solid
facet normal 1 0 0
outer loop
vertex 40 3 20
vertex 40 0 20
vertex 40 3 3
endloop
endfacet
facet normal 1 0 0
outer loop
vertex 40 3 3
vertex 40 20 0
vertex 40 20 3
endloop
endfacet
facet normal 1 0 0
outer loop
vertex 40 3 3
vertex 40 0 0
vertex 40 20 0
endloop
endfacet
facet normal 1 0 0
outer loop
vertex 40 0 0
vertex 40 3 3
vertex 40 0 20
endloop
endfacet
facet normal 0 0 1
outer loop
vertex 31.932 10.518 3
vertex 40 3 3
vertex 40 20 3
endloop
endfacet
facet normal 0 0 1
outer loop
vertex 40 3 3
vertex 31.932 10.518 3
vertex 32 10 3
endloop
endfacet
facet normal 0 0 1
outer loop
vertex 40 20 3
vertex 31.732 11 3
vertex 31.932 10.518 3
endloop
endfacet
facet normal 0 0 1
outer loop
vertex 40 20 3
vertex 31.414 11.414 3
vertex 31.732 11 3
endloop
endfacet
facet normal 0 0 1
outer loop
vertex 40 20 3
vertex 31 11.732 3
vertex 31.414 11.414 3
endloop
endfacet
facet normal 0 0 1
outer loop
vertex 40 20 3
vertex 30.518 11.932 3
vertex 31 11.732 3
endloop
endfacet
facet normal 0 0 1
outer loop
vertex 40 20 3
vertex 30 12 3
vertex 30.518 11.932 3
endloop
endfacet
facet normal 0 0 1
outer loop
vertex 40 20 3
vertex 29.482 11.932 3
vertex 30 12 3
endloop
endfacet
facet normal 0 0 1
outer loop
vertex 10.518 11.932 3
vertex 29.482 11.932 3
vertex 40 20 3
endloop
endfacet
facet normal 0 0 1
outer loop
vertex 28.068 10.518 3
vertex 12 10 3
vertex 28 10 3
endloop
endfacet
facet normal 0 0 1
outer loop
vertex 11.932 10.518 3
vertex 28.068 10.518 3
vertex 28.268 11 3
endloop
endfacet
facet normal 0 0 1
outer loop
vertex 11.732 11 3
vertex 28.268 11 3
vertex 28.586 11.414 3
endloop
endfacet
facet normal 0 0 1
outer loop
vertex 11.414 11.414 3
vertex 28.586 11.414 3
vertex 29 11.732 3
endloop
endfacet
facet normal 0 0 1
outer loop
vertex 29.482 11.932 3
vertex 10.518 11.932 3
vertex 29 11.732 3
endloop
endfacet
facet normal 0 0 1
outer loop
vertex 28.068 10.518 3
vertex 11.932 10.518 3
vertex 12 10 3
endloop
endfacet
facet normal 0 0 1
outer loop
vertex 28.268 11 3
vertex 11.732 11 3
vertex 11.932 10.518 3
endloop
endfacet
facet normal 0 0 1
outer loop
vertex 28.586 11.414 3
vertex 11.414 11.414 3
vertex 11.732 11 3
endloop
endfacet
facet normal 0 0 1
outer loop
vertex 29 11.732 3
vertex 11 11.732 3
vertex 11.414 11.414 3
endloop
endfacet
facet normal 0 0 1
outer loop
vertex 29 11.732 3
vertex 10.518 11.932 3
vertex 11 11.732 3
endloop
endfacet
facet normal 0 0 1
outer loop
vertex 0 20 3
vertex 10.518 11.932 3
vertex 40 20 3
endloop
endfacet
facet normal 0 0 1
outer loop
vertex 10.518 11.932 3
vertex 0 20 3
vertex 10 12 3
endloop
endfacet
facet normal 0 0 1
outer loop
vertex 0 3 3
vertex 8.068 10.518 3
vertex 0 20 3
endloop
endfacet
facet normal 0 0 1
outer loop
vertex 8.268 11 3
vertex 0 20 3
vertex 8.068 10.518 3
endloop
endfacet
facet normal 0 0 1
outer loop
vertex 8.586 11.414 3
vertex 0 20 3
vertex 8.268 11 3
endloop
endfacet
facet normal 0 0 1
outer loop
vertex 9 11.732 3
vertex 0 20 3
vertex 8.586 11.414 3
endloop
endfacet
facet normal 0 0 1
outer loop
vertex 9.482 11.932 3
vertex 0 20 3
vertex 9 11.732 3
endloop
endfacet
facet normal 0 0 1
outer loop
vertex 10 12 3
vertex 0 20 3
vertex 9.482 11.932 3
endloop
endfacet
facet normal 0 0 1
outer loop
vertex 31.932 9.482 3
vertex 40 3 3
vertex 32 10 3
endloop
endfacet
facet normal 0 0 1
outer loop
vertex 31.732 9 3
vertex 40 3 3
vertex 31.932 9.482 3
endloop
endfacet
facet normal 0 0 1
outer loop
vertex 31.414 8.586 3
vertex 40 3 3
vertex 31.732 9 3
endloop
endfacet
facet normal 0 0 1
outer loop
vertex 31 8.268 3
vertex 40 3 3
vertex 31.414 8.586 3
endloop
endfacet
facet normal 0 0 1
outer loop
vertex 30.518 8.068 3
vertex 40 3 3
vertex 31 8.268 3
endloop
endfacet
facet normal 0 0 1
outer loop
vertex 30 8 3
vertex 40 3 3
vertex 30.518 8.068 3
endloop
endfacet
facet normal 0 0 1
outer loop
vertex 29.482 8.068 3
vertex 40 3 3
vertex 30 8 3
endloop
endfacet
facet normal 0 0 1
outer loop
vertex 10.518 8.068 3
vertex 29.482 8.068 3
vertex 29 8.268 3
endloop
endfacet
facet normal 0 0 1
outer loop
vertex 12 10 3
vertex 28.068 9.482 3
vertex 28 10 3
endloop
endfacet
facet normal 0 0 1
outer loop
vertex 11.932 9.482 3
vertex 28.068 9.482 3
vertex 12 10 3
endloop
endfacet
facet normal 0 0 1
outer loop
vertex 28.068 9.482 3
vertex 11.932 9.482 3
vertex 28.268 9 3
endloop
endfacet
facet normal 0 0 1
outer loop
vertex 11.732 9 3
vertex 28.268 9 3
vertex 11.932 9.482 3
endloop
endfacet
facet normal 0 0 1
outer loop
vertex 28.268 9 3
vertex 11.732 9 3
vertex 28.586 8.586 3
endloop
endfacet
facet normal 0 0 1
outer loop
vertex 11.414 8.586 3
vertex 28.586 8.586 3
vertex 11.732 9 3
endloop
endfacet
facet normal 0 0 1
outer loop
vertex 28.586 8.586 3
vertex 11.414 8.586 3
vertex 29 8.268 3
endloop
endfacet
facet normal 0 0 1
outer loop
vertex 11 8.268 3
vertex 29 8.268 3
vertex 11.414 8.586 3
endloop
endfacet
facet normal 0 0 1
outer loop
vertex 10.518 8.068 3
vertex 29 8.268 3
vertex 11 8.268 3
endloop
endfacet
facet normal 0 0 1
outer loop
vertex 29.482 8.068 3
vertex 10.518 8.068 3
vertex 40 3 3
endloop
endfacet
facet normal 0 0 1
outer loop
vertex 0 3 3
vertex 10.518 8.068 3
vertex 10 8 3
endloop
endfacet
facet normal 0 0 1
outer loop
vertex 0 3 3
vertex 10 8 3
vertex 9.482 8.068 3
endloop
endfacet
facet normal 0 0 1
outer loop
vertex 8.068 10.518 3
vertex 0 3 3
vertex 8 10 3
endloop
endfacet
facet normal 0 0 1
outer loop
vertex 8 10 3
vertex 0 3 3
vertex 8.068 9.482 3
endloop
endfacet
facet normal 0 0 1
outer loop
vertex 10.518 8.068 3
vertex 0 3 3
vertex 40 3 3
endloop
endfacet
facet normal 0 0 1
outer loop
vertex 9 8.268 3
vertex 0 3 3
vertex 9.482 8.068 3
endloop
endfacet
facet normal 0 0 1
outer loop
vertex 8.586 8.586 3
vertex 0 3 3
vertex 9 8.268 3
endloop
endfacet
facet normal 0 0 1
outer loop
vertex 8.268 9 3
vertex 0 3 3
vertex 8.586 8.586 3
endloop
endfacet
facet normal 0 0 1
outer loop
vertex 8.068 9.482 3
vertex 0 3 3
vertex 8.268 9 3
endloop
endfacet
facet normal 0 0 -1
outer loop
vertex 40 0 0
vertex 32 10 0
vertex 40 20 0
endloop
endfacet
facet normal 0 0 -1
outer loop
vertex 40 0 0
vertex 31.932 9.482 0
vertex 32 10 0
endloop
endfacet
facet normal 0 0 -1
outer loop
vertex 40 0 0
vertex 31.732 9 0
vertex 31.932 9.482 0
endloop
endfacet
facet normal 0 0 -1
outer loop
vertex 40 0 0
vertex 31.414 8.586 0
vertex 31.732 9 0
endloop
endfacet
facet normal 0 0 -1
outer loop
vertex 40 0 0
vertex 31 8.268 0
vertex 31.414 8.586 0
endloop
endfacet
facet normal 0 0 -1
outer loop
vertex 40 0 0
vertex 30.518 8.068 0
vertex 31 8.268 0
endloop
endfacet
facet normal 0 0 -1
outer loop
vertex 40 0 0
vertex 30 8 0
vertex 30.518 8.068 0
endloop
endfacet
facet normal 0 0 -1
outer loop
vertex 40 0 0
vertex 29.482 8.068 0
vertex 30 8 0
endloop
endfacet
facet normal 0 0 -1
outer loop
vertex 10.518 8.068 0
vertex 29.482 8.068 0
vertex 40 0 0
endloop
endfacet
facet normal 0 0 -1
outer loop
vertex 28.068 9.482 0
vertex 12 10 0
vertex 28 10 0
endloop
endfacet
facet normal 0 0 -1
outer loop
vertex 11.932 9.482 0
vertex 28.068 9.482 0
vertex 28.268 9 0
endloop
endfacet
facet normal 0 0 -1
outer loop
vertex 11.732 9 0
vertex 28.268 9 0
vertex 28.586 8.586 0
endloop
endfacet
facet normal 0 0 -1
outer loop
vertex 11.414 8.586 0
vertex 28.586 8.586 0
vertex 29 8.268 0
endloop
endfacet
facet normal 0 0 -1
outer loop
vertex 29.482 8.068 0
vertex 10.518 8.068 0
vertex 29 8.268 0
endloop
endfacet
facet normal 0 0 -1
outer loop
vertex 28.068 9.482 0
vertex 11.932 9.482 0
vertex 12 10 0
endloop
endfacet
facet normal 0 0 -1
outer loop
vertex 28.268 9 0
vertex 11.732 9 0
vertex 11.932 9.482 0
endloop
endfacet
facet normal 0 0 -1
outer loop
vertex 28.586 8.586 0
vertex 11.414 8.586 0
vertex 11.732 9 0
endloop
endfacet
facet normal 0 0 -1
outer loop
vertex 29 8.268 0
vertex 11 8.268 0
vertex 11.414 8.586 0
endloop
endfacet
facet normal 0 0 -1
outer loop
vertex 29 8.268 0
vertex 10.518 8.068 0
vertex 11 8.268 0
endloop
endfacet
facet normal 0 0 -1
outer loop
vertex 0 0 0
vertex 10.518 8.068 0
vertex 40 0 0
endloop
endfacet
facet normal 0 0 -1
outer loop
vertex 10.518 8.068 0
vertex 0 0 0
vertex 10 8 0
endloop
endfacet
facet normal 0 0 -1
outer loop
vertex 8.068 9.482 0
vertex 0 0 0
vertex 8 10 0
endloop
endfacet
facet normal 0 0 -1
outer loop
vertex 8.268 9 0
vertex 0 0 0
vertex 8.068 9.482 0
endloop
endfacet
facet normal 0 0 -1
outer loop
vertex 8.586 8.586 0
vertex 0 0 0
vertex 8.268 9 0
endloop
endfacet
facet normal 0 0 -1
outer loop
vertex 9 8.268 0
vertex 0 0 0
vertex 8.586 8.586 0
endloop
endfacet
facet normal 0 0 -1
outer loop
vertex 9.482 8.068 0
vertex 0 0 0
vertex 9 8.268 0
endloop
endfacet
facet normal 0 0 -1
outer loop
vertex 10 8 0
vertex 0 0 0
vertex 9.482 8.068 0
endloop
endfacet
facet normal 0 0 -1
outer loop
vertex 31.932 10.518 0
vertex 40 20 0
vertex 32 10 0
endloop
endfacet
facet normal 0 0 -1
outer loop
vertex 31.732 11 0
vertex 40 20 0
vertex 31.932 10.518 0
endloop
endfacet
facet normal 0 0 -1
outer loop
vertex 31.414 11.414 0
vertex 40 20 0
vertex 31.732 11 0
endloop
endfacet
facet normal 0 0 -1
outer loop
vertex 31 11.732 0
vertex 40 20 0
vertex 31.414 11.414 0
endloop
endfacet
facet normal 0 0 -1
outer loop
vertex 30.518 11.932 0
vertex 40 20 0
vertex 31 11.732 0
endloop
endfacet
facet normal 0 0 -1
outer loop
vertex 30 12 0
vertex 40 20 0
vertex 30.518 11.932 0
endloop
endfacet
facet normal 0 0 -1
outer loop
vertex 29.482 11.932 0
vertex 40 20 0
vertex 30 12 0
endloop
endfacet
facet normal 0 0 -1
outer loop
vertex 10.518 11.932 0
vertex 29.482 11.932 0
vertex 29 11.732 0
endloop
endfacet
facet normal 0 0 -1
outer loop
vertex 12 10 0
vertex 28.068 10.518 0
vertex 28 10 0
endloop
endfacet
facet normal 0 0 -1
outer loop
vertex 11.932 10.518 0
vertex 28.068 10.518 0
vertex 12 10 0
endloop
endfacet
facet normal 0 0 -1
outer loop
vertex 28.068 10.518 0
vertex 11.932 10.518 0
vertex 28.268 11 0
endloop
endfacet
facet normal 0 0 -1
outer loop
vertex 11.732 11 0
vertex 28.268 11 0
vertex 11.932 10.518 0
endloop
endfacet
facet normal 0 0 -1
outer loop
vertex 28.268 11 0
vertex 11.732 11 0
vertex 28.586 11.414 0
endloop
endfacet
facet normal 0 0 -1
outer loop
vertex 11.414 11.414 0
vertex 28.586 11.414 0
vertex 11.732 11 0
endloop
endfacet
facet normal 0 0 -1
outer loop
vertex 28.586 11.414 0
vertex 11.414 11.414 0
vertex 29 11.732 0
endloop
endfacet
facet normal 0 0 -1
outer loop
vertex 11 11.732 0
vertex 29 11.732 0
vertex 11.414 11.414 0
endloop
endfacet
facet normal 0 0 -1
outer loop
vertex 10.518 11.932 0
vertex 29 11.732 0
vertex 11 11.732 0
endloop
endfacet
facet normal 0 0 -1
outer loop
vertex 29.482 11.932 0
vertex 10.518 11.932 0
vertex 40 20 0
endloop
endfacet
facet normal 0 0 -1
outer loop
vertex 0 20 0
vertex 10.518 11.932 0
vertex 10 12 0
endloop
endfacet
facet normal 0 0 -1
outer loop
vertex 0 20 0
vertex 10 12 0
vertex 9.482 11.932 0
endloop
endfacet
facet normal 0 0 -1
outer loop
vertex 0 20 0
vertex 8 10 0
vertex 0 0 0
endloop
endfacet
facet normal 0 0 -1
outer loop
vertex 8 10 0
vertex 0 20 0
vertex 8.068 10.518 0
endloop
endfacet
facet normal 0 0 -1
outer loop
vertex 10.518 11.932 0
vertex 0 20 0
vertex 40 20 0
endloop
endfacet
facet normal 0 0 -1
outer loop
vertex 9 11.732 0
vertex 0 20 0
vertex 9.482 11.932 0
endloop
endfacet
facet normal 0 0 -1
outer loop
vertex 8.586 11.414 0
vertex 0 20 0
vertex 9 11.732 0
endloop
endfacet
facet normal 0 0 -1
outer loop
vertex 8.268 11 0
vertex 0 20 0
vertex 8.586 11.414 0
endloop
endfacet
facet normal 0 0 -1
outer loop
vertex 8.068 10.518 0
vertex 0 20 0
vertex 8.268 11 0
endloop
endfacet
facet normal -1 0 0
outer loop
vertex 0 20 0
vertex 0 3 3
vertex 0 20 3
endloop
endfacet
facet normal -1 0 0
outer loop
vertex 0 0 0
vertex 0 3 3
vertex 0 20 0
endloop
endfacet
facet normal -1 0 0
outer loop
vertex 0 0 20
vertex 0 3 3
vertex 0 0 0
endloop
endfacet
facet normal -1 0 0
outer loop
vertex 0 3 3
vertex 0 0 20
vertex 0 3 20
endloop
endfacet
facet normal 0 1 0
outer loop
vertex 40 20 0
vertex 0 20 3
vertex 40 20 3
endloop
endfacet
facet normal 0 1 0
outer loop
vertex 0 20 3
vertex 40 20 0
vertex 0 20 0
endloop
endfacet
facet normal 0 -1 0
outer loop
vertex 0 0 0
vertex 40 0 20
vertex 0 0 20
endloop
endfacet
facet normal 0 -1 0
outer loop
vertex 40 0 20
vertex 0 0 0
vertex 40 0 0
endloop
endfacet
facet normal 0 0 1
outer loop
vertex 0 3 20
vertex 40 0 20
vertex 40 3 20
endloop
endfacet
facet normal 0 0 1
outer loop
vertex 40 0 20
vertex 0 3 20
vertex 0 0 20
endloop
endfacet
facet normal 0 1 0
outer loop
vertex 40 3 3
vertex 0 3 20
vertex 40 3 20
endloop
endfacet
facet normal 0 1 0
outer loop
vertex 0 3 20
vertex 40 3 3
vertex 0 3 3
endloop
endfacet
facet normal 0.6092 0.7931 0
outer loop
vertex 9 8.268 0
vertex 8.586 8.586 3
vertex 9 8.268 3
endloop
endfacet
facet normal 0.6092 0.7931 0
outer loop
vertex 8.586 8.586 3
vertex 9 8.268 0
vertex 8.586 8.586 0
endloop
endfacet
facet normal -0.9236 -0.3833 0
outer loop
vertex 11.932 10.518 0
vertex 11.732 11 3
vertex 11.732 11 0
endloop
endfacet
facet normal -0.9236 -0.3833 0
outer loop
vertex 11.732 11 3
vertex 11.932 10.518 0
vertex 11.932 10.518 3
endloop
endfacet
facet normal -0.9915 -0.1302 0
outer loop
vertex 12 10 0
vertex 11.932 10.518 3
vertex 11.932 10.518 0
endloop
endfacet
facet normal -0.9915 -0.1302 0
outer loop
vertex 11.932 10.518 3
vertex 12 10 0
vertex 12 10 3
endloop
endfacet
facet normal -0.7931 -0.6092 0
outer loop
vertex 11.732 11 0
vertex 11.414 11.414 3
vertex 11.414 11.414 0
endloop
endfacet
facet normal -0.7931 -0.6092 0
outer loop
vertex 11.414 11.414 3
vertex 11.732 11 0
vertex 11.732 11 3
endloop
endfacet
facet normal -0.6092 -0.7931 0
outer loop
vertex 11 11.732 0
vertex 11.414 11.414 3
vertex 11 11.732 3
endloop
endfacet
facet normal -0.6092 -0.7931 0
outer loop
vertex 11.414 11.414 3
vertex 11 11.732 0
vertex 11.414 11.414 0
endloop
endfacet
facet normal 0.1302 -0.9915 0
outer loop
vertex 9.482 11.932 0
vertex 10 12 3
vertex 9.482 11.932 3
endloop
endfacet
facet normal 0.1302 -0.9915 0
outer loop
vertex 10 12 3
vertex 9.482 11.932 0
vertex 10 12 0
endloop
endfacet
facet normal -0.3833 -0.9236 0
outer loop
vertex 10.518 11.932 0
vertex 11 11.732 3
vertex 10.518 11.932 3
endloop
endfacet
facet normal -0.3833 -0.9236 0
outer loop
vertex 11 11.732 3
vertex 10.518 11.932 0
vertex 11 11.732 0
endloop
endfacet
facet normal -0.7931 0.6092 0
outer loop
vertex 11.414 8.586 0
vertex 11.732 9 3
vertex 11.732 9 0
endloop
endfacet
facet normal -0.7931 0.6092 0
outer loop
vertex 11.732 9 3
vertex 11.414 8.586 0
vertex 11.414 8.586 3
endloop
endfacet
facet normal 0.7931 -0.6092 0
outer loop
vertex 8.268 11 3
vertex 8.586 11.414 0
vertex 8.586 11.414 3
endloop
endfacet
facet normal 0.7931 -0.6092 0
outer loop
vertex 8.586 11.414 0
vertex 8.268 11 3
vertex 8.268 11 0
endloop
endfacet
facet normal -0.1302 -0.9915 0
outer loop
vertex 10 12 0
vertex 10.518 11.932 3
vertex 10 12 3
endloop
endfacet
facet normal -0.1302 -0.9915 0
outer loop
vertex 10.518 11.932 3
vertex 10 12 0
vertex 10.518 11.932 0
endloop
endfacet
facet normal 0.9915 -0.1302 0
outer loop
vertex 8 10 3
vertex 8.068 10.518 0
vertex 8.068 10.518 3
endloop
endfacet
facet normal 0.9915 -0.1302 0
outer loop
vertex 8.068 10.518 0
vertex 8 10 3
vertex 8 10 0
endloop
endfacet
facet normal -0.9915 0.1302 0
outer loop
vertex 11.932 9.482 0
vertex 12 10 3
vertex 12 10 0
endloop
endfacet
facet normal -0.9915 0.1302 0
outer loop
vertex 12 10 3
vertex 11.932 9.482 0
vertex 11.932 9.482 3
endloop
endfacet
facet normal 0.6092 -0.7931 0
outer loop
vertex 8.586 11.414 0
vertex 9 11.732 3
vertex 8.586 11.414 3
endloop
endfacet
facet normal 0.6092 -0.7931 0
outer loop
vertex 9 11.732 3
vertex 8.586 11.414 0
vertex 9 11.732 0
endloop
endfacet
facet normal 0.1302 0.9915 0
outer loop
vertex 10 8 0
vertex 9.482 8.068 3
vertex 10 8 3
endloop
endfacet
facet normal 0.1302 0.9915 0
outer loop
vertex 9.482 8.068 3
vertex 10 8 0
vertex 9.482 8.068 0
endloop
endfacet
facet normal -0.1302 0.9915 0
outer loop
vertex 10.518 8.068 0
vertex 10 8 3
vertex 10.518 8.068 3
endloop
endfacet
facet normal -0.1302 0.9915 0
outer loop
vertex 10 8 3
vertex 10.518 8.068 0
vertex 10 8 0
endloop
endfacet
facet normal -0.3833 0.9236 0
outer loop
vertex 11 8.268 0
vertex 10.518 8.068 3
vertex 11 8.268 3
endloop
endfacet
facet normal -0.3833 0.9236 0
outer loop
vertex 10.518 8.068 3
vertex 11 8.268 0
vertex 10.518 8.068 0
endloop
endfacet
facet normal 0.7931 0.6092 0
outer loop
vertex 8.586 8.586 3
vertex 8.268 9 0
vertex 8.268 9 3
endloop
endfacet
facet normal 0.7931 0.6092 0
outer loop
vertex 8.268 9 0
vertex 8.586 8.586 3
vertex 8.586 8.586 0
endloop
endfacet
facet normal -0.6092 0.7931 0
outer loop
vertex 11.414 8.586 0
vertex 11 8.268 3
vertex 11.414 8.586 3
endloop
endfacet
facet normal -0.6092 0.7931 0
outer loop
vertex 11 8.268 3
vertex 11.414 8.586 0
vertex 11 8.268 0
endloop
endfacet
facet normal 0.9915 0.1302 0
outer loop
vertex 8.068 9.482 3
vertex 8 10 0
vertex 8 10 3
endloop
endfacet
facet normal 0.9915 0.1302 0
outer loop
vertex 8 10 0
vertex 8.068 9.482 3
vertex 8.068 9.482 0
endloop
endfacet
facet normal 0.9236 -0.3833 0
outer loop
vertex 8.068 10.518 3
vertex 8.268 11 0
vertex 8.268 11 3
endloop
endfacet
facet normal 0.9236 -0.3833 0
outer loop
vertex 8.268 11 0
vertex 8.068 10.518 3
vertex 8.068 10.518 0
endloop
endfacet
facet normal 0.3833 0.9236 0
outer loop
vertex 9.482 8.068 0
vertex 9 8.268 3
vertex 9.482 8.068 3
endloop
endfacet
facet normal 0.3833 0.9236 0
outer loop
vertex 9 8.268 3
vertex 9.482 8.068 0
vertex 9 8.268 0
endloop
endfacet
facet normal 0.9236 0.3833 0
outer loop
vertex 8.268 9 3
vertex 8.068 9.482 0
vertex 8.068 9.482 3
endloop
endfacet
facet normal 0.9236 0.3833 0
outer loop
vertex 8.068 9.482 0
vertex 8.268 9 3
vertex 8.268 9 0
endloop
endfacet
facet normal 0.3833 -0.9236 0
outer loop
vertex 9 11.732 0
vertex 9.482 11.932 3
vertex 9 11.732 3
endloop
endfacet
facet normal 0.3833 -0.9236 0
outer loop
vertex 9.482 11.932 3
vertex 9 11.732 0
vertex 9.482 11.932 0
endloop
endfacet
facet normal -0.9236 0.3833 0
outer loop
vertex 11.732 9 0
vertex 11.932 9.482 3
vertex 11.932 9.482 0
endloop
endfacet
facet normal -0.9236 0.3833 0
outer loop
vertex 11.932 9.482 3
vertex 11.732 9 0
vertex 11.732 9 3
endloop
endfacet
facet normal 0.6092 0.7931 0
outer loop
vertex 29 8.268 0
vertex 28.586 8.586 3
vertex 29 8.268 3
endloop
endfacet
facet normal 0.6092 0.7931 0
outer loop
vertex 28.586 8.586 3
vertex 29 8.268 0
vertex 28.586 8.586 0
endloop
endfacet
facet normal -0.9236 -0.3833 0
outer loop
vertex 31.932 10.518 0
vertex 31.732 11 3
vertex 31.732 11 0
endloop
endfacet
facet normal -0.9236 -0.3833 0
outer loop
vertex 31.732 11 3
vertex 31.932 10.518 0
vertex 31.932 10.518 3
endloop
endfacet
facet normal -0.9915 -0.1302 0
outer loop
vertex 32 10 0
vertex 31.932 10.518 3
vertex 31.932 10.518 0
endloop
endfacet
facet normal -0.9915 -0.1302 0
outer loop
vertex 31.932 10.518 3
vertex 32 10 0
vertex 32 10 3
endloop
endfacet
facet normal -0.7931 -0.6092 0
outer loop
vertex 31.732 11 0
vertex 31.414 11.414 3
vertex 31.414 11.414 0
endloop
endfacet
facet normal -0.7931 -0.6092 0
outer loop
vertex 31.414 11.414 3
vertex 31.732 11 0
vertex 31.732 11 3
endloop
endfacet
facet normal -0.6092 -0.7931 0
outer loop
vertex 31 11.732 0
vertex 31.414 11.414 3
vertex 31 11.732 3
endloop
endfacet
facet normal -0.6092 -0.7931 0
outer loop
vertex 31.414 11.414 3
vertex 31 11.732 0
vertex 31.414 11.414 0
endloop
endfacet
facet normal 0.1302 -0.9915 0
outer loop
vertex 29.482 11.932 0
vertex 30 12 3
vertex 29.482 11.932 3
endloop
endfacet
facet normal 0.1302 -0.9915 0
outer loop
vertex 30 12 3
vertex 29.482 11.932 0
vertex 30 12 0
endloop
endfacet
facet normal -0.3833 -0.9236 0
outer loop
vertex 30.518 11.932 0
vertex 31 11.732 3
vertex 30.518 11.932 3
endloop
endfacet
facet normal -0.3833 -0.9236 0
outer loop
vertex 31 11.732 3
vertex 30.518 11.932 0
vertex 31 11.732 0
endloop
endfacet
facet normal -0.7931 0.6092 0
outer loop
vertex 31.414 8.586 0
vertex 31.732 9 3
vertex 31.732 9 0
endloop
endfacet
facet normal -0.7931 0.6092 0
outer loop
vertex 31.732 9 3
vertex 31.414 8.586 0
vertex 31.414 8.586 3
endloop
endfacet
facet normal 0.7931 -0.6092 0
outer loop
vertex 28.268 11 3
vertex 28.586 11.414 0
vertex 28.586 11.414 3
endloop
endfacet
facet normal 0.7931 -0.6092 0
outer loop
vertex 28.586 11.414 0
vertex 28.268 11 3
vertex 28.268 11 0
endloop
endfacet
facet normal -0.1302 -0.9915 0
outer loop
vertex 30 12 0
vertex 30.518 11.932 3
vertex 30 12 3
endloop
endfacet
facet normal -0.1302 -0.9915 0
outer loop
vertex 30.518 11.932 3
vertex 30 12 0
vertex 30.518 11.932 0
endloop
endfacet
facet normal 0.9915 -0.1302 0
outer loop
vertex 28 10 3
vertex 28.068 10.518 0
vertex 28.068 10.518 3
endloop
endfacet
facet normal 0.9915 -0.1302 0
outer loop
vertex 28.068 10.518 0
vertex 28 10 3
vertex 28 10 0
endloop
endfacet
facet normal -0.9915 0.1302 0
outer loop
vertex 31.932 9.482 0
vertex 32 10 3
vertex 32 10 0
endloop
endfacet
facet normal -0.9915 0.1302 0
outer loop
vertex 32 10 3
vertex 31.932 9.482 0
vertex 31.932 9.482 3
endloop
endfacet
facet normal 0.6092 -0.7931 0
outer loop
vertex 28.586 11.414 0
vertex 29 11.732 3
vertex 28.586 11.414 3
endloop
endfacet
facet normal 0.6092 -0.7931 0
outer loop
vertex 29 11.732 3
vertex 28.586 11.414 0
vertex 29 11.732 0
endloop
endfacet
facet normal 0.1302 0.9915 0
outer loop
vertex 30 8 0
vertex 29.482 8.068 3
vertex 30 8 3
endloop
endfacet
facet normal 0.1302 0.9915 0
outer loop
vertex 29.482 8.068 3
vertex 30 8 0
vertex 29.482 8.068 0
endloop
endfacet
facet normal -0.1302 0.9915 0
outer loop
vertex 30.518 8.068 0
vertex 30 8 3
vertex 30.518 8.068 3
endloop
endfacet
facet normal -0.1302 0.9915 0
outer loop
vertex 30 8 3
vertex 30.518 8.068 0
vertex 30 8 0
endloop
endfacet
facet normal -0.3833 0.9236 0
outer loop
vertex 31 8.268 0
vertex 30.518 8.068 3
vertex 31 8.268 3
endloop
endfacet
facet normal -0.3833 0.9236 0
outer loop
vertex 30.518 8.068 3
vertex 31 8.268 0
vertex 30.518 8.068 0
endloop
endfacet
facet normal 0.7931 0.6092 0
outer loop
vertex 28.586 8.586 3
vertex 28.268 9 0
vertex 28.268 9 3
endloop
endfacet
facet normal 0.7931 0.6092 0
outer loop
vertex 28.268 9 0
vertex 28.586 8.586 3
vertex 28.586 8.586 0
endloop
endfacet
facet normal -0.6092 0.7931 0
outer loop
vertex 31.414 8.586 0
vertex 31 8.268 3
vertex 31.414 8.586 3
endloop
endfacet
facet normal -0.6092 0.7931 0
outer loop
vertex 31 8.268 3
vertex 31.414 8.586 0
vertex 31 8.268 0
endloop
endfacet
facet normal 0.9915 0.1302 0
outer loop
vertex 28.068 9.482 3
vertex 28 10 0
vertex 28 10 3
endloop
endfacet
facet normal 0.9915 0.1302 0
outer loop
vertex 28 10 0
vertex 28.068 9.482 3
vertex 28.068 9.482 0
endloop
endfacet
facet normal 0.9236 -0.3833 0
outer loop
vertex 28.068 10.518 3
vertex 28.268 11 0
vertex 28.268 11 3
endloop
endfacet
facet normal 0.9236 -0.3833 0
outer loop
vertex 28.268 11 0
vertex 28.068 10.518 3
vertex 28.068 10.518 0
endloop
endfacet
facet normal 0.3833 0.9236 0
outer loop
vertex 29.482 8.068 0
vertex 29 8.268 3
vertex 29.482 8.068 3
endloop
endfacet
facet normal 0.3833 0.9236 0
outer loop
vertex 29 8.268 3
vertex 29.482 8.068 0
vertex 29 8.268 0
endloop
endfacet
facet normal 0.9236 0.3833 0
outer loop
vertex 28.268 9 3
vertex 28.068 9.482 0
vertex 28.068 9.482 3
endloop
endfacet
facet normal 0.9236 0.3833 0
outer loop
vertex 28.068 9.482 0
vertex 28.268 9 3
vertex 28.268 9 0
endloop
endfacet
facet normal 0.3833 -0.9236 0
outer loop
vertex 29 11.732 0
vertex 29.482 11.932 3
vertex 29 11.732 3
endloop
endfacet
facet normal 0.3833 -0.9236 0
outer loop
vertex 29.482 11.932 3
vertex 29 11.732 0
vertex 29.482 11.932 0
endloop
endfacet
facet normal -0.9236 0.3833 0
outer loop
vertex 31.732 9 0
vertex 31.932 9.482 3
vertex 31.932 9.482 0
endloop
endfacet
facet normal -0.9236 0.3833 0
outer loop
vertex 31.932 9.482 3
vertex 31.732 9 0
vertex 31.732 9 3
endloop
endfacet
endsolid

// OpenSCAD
// file: profile.scad
// Edit this dependency to exercise live reload without changing bracket.scad.
echo("Included profile",1);
// main file
/* [Bracket] */
// Outside width in mm
width = 40; // [20:1:100]
// Wall thickness in mm
wall = 3; // [1:0.5:8]
// Mounting hole diameter
hole = 4; // [3:Small, 4:Medium, 6:Large]
// Show the mounting holes
holes = true;
color_name = "orange"; // [orange, blue, green]
position = [0,0,0];
include <profile.scad>
translate(position) color(color_name) difference() {
  union() {
    cube([width,20,wall]);
    cube([width,wall,20]);
  }
  if (holes) for (x=[width/4,3*width/4]) translate([x,10,-1]) cylinder(d=hole,h=wall+2,$fn=24);
}
echo("Bracket width",width,"wall",wall);
